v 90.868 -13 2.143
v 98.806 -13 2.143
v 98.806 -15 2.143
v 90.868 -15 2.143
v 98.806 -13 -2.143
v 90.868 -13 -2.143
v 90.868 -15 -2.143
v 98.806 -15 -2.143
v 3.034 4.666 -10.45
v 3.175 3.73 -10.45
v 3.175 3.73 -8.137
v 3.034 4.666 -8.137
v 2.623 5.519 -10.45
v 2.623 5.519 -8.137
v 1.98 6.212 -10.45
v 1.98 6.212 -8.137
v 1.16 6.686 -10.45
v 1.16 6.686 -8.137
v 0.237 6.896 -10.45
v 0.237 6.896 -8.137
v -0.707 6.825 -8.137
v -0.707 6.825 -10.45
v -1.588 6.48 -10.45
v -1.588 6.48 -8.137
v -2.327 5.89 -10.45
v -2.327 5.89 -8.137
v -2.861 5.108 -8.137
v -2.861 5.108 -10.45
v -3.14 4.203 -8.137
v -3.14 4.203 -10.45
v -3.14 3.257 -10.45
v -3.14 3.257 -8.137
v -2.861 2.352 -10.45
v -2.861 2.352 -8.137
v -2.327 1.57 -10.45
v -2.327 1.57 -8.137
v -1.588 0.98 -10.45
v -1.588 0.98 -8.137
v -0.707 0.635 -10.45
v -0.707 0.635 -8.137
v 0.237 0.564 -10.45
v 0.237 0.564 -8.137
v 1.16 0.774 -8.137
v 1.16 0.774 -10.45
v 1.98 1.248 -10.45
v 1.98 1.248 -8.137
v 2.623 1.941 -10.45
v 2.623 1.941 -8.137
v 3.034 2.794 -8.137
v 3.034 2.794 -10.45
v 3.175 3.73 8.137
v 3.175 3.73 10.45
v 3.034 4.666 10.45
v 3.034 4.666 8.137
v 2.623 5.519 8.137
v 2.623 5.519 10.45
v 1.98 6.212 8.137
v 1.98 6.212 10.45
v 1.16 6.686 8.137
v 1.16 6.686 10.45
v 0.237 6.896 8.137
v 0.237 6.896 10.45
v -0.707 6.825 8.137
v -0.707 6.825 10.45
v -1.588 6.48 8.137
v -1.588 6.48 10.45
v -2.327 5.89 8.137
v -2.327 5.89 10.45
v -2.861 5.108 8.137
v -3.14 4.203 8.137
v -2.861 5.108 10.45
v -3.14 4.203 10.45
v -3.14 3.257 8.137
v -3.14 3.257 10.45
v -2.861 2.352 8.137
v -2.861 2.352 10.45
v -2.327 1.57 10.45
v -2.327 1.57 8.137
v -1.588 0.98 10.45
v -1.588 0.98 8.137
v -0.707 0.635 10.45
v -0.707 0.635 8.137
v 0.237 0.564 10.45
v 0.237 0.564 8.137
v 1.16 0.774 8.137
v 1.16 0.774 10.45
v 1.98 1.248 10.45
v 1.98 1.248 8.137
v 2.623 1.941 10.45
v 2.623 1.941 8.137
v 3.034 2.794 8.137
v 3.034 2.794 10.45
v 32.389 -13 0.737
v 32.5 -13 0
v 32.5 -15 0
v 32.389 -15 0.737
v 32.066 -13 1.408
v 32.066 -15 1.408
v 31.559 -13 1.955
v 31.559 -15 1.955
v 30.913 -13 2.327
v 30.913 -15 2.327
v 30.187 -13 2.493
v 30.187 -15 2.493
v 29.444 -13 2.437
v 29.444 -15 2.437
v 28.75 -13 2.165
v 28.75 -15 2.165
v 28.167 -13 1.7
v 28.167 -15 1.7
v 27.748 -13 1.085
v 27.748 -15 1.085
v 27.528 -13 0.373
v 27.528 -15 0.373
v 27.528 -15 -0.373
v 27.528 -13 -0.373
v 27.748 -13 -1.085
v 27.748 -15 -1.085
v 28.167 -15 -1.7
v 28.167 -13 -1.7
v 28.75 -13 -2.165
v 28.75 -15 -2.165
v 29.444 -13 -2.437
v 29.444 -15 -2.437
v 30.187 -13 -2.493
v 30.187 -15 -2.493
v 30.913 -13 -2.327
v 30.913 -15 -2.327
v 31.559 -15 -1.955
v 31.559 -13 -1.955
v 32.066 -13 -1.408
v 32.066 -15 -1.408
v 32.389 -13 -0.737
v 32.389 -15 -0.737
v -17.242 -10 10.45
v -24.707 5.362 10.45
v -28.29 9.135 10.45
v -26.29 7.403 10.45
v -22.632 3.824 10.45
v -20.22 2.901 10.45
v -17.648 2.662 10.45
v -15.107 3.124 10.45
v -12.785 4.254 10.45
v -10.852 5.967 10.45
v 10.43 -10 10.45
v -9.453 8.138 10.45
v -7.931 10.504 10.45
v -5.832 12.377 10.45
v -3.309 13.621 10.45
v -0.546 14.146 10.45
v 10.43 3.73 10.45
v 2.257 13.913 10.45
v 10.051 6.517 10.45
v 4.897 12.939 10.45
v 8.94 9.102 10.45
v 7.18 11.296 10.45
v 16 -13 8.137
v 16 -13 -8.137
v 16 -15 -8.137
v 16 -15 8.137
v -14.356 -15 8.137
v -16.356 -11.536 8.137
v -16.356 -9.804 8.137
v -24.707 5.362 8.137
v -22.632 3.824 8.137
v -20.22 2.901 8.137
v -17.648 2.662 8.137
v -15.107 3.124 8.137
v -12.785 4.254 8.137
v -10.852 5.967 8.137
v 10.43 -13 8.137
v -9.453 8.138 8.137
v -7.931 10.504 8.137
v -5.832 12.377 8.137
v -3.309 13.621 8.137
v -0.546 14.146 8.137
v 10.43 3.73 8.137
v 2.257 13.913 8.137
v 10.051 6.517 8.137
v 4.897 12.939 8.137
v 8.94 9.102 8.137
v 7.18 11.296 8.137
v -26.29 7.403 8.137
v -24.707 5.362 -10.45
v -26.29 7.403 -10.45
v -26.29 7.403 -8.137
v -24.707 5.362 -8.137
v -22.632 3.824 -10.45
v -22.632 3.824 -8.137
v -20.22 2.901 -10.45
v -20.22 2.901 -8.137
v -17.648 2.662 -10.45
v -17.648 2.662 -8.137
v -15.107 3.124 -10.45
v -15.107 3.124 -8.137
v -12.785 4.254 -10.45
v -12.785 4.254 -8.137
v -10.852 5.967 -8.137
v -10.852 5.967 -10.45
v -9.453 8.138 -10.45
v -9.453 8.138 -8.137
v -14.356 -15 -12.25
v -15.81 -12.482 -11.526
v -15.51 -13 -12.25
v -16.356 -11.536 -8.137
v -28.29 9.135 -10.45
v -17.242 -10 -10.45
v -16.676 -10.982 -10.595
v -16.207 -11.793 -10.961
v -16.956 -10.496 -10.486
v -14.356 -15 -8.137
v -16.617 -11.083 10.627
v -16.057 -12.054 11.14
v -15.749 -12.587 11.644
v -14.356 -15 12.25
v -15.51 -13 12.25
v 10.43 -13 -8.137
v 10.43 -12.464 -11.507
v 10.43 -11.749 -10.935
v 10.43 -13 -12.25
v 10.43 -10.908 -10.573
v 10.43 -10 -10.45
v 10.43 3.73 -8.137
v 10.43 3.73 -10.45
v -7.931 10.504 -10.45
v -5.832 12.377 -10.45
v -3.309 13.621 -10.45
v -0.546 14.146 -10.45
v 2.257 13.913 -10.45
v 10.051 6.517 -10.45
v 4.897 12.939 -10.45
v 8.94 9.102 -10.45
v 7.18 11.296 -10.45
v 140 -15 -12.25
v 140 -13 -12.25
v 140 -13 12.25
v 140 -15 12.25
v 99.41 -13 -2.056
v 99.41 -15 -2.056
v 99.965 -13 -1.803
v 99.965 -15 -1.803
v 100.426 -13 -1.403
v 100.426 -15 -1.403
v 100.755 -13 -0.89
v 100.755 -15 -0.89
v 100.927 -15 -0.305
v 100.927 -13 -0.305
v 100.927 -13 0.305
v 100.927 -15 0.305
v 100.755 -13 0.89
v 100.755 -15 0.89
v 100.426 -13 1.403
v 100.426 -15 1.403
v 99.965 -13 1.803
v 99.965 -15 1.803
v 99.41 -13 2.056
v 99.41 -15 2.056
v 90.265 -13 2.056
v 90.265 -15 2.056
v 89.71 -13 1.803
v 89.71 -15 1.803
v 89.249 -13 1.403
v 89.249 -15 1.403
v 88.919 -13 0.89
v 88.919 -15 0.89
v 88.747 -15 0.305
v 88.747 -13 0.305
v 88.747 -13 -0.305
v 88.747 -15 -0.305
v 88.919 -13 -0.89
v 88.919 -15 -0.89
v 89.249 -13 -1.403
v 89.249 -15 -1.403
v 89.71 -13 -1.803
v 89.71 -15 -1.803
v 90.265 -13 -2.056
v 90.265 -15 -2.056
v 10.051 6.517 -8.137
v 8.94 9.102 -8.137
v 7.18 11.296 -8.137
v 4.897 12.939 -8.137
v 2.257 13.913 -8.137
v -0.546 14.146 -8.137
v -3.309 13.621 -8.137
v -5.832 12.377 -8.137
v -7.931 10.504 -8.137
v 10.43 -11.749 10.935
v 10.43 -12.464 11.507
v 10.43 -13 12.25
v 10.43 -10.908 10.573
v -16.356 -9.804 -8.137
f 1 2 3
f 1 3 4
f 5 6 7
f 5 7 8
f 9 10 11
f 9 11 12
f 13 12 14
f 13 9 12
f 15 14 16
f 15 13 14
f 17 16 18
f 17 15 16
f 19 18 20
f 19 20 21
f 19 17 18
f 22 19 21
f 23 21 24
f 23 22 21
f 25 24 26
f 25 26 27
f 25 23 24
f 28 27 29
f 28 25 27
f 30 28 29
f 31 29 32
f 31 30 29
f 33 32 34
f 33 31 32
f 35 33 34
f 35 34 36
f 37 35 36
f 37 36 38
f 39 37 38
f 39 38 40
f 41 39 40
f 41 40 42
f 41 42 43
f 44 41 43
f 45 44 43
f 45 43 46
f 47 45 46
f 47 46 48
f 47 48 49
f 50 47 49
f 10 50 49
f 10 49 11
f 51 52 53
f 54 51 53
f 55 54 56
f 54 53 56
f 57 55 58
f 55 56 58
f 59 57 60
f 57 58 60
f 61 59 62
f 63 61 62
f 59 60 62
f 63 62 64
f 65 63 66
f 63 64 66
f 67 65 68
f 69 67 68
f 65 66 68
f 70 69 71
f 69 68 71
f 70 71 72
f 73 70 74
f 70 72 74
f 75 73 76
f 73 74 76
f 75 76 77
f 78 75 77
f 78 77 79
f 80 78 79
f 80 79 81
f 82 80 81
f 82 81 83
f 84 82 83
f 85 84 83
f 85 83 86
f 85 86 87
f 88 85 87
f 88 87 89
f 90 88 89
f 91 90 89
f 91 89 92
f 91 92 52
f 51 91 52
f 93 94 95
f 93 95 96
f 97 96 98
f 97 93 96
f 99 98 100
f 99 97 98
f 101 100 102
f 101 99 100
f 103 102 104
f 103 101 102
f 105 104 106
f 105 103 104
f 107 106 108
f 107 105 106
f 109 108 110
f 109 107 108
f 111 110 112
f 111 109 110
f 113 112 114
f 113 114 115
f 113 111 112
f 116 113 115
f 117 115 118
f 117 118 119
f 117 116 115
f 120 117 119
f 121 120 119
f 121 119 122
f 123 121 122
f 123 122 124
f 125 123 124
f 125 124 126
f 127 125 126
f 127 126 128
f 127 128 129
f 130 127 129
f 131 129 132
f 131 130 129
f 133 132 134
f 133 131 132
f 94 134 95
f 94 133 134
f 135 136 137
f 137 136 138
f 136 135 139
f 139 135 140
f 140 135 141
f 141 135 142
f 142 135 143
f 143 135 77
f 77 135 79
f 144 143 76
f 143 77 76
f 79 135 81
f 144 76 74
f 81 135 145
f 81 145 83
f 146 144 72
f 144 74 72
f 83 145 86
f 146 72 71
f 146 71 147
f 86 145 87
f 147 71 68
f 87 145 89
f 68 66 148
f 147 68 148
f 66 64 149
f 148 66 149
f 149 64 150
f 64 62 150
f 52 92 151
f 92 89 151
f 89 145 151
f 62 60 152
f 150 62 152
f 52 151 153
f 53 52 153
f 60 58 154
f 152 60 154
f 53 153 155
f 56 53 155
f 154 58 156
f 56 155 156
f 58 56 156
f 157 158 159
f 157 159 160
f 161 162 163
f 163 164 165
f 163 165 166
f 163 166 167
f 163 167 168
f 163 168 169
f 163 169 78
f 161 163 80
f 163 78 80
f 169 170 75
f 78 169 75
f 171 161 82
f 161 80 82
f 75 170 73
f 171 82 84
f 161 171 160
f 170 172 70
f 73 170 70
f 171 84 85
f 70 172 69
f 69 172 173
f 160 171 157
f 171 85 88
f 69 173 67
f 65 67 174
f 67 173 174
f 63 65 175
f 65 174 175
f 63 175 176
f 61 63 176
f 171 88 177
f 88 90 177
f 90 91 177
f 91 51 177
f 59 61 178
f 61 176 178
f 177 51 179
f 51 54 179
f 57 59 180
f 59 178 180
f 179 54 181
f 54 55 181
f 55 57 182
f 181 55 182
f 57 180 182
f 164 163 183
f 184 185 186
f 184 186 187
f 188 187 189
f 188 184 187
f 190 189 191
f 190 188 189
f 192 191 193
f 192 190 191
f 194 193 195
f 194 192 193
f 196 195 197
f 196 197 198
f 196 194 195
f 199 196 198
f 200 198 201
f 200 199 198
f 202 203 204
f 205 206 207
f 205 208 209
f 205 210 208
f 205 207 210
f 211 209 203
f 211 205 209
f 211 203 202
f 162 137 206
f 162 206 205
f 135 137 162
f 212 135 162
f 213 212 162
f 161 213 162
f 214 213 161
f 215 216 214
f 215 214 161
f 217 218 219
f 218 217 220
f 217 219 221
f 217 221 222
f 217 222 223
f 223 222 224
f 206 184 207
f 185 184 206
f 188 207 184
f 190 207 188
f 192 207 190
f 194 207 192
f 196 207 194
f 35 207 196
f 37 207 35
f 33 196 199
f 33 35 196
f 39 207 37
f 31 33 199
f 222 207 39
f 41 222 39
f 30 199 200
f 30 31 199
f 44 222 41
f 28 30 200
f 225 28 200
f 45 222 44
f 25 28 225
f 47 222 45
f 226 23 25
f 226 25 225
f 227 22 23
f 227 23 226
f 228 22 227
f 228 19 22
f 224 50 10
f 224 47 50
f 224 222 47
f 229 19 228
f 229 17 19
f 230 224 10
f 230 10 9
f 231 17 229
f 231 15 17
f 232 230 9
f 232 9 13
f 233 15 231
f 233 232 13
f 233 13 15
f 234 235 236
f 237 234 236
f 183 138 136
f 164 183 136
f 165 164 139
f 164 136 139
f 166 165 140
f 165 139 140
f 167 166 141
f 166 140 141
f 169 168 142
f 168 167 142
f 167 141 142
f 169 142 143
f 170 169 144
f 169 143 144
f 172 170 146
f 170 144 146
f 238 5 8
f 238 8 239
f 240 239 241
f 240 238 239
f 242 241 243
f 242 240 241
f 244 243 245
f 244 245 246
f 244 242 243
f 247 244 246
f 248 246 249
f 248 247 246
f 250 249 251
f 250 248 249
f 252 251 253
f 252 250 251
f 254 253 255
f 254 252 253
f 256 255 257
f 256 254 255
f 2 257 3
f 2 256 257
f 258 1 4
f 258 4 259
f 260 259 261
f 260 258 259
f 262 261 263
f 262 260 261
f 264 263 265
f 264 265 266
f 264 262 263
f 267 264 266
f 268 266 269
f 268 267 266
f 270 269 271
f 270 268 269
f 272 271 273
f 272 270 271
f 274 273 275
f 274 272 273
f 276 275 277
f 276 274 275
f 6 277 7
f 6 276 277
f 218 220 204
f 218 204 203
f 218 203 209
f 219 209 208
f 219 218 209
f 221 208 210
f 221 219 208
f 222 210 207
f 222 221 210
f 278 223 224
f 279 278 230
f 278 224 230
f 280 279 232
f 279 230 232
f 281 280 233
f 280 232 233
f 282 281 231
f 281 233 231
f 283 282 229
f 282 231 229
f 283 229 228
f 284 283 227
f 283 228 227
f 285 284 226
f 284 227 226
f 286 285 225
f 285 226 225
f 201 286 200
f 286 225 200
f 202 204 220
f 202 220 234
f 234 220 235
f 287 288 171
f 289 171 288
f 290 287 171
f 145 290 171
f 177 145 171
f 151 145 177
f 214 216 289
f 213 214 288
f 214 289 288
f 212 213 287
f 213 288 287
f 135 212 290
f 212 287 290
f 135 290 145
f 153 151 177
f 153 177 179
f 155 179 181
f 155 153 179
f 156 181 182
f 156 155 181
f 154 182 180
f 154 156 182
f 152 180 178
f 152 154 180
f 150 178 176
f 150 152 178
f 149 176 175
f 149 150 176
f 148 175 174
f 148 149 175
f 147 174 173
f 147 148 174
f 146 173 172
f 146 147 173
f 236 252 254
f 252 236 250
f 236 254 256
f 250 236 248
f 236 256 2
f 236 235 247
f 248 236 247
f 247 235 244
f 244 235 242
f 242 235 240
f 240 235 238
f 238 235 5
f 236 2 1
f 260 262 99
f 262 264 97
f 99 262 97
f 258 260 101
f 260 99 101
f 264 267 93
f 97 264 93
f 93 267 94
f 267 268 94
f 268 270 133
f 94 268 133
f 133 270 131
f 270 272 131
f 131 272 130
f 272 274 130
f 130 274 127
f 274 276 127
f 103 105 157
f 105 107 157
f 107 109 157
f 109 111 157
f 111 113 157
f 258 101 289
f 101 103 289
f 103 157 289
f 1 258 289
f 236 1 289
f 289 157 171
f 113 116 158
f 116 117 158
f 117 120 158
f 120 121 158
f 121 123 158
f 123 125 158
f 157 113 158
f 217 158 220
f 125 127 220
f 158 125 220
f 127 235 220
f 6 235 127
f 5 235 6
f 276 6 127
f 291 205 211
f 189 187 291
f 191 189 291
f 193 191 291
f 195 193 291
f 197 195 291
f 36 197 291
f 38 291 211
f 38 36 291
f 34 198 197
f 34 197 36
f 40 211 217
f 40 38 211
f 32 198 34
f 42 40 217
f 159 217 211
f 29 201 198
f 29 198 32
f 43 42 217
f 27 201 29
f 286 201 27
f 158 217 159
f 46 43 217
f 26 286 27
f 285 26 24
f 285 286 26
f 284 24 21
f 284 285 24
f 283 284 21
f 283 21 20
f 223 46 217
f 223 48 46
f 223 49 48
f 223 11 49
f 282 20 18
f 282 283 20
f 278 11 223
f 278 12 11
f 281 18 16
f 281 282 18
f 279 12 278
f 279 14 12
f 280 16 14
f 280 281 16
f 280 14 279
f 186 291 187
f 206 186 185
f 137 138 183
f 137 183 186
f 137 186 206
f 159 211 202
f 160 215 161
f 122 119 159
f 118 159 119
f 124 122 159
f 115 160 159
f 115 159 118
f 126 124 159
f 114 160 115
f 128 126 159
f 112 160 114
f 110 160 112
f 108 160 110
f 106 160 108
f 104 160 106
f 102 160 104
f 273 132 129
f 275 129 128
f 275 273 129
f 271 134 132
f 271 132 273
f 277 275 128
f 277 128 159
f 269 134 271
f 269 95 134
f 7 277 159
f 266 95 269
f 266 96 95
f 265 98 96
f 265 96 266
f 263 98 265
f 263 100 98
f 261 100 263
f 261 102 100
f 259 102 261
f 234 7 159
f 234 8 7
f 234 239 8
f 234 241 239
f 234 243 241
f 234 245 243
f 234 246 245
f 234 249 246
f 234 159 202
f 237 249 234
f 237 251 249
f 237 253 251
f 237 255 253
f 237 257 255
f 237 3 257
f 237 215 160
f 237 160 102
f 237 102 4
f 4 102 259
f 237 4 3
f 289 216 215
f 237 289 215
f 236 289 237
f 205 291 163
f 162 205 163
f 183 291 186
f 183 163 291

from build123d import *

# Parameters (mm, degrees)
SKETCH019_W          = 124
SKETCH019_H          = 24.5
SKETCH019_R          = 2.5
PAD010_DEPTH         = 2
SKETCH018_R          = 3.175
PAD011_DEPTH         = 4.1125
PAD012_DEPTH         = 12.25
POCKET005_DEPTH      = 373.382623
POCKET005_DEPTH_BACK = 485.092667
SKETCH022_W          = 3
SKETCH022_H          = 16.275
POCKET006_DEPTH      = 14.161
POCKET006_DEPTH_BACK = 15.001


with BuildPart() as part:
    # Sketch019 → Pad010 (new body)
    with BuildSketch(Plane.XZ.offset(13)):
        with Locations((78, 0)):
            Rectangle(SKETCH019_W, SKETCH019_H)
        with Locations((30, 0)):
            Circle(SKETCH019_R, mode=Mode.SUBTRACT)
        with BuildLine():
            ThreePointArc((90.8685, 2.143), (88.7255, 0), (90.8685, -2.143))
            Line((90.8685, -2.143), (98.806, -2.143))
            ThreePointArc((98.806, -2.143), (100.949, 0), (98.806, 2.143))
            Line((98.806, 2.143), (90.8685, 2.143))
        make_face(mode=Mode.SUBTRACT)
    extrude(amount=PAD010_DEPTH)

    # Sketch018 → Pad011 (join)
    with BuildSketch(Plane.XY.offset(12.25)):
        with BuildLine():
            Line((16, -13), (10.43, -13))
            Line((10.43, -13), (10.43, 3.73))
            ThreePointArc((10.43, 3.73), (2.257465, 13.912767), (-9.45279, 8.137908))
            ThreePointArc((-26.289956, 7.402782), (-17.64833, 2.661824), (-9.45279, 8.137908))
            Line((-26.289956, 7.402782), (-13.355703, -15))
            Line((-13.355703, -15), (16, -15))
            Line((16, -15), (16, -13))
        make_face()
        with Locations((0, 3.73)):
            Circle(SKETCH018_R, mode=Mode.SUBTRACT)
    pad011 = extrude(amount=-PAD011_DEPTH)

    # Mirrored003: Pad011 across XY
    add(pad011.mirror(Plane.XY))

    # Sketch020 → Pad012 (join, symmetric)
    with BuildSketch(Plane.XY):
        Polygon((-26.289956, 7.402782), (-28.289956, 9.134833), (-14.355703, -15), (-13.355703, -15), align=None)
    extrude(amount=PAD012_DEPTH, both=True)

    # Sketch021 → Pocket005 (cut, two sides)
    with BuildSketch(Plane.YZ) as pocket005_sk:
        with BuildLine():
            ThreePointArc((-13, 12.25), (-11.749286, 10.934524), (-10, 10.45))
            Line((-10, 10.45), (14.16, 10.45))
            Line((14.16, 12.25), (14.16, 10.45))
            Line((14.16, 12.25), (-13, 12.25))
        make_face()
    pocket005 = extrude(amount=-POCKET005_DEPTH, mode=Mode.SUBTRACT) + extrude(pocket005_sk.sketch, amount=POCKET005_DEPTH_BACK, mode=Mode.SUBTRACT)

    # Mirrored004: Pocket005 across Sketch021 H_Axis
    add(pocket005.mirror(Plane.XY), mode=Mode.SUBTRACT)

    # Sketch022 → Pocket006 (cut, two sides)
    with BuildSketch(Plane.XZ) as pocket006_sk:
        with Locations((-14.855703, 0)):
            Rectangle(SKETCH022_W, SKETCH022_H)
    extrude(amount=-POCKET006_DEPTH, mode=Mode.SUBTRACT)
    extrude(pocket006_sk.sketch, amount=POCKET006_DEPTH_BACK, mode=Mode.SUBTRACT)


solid = part.part
